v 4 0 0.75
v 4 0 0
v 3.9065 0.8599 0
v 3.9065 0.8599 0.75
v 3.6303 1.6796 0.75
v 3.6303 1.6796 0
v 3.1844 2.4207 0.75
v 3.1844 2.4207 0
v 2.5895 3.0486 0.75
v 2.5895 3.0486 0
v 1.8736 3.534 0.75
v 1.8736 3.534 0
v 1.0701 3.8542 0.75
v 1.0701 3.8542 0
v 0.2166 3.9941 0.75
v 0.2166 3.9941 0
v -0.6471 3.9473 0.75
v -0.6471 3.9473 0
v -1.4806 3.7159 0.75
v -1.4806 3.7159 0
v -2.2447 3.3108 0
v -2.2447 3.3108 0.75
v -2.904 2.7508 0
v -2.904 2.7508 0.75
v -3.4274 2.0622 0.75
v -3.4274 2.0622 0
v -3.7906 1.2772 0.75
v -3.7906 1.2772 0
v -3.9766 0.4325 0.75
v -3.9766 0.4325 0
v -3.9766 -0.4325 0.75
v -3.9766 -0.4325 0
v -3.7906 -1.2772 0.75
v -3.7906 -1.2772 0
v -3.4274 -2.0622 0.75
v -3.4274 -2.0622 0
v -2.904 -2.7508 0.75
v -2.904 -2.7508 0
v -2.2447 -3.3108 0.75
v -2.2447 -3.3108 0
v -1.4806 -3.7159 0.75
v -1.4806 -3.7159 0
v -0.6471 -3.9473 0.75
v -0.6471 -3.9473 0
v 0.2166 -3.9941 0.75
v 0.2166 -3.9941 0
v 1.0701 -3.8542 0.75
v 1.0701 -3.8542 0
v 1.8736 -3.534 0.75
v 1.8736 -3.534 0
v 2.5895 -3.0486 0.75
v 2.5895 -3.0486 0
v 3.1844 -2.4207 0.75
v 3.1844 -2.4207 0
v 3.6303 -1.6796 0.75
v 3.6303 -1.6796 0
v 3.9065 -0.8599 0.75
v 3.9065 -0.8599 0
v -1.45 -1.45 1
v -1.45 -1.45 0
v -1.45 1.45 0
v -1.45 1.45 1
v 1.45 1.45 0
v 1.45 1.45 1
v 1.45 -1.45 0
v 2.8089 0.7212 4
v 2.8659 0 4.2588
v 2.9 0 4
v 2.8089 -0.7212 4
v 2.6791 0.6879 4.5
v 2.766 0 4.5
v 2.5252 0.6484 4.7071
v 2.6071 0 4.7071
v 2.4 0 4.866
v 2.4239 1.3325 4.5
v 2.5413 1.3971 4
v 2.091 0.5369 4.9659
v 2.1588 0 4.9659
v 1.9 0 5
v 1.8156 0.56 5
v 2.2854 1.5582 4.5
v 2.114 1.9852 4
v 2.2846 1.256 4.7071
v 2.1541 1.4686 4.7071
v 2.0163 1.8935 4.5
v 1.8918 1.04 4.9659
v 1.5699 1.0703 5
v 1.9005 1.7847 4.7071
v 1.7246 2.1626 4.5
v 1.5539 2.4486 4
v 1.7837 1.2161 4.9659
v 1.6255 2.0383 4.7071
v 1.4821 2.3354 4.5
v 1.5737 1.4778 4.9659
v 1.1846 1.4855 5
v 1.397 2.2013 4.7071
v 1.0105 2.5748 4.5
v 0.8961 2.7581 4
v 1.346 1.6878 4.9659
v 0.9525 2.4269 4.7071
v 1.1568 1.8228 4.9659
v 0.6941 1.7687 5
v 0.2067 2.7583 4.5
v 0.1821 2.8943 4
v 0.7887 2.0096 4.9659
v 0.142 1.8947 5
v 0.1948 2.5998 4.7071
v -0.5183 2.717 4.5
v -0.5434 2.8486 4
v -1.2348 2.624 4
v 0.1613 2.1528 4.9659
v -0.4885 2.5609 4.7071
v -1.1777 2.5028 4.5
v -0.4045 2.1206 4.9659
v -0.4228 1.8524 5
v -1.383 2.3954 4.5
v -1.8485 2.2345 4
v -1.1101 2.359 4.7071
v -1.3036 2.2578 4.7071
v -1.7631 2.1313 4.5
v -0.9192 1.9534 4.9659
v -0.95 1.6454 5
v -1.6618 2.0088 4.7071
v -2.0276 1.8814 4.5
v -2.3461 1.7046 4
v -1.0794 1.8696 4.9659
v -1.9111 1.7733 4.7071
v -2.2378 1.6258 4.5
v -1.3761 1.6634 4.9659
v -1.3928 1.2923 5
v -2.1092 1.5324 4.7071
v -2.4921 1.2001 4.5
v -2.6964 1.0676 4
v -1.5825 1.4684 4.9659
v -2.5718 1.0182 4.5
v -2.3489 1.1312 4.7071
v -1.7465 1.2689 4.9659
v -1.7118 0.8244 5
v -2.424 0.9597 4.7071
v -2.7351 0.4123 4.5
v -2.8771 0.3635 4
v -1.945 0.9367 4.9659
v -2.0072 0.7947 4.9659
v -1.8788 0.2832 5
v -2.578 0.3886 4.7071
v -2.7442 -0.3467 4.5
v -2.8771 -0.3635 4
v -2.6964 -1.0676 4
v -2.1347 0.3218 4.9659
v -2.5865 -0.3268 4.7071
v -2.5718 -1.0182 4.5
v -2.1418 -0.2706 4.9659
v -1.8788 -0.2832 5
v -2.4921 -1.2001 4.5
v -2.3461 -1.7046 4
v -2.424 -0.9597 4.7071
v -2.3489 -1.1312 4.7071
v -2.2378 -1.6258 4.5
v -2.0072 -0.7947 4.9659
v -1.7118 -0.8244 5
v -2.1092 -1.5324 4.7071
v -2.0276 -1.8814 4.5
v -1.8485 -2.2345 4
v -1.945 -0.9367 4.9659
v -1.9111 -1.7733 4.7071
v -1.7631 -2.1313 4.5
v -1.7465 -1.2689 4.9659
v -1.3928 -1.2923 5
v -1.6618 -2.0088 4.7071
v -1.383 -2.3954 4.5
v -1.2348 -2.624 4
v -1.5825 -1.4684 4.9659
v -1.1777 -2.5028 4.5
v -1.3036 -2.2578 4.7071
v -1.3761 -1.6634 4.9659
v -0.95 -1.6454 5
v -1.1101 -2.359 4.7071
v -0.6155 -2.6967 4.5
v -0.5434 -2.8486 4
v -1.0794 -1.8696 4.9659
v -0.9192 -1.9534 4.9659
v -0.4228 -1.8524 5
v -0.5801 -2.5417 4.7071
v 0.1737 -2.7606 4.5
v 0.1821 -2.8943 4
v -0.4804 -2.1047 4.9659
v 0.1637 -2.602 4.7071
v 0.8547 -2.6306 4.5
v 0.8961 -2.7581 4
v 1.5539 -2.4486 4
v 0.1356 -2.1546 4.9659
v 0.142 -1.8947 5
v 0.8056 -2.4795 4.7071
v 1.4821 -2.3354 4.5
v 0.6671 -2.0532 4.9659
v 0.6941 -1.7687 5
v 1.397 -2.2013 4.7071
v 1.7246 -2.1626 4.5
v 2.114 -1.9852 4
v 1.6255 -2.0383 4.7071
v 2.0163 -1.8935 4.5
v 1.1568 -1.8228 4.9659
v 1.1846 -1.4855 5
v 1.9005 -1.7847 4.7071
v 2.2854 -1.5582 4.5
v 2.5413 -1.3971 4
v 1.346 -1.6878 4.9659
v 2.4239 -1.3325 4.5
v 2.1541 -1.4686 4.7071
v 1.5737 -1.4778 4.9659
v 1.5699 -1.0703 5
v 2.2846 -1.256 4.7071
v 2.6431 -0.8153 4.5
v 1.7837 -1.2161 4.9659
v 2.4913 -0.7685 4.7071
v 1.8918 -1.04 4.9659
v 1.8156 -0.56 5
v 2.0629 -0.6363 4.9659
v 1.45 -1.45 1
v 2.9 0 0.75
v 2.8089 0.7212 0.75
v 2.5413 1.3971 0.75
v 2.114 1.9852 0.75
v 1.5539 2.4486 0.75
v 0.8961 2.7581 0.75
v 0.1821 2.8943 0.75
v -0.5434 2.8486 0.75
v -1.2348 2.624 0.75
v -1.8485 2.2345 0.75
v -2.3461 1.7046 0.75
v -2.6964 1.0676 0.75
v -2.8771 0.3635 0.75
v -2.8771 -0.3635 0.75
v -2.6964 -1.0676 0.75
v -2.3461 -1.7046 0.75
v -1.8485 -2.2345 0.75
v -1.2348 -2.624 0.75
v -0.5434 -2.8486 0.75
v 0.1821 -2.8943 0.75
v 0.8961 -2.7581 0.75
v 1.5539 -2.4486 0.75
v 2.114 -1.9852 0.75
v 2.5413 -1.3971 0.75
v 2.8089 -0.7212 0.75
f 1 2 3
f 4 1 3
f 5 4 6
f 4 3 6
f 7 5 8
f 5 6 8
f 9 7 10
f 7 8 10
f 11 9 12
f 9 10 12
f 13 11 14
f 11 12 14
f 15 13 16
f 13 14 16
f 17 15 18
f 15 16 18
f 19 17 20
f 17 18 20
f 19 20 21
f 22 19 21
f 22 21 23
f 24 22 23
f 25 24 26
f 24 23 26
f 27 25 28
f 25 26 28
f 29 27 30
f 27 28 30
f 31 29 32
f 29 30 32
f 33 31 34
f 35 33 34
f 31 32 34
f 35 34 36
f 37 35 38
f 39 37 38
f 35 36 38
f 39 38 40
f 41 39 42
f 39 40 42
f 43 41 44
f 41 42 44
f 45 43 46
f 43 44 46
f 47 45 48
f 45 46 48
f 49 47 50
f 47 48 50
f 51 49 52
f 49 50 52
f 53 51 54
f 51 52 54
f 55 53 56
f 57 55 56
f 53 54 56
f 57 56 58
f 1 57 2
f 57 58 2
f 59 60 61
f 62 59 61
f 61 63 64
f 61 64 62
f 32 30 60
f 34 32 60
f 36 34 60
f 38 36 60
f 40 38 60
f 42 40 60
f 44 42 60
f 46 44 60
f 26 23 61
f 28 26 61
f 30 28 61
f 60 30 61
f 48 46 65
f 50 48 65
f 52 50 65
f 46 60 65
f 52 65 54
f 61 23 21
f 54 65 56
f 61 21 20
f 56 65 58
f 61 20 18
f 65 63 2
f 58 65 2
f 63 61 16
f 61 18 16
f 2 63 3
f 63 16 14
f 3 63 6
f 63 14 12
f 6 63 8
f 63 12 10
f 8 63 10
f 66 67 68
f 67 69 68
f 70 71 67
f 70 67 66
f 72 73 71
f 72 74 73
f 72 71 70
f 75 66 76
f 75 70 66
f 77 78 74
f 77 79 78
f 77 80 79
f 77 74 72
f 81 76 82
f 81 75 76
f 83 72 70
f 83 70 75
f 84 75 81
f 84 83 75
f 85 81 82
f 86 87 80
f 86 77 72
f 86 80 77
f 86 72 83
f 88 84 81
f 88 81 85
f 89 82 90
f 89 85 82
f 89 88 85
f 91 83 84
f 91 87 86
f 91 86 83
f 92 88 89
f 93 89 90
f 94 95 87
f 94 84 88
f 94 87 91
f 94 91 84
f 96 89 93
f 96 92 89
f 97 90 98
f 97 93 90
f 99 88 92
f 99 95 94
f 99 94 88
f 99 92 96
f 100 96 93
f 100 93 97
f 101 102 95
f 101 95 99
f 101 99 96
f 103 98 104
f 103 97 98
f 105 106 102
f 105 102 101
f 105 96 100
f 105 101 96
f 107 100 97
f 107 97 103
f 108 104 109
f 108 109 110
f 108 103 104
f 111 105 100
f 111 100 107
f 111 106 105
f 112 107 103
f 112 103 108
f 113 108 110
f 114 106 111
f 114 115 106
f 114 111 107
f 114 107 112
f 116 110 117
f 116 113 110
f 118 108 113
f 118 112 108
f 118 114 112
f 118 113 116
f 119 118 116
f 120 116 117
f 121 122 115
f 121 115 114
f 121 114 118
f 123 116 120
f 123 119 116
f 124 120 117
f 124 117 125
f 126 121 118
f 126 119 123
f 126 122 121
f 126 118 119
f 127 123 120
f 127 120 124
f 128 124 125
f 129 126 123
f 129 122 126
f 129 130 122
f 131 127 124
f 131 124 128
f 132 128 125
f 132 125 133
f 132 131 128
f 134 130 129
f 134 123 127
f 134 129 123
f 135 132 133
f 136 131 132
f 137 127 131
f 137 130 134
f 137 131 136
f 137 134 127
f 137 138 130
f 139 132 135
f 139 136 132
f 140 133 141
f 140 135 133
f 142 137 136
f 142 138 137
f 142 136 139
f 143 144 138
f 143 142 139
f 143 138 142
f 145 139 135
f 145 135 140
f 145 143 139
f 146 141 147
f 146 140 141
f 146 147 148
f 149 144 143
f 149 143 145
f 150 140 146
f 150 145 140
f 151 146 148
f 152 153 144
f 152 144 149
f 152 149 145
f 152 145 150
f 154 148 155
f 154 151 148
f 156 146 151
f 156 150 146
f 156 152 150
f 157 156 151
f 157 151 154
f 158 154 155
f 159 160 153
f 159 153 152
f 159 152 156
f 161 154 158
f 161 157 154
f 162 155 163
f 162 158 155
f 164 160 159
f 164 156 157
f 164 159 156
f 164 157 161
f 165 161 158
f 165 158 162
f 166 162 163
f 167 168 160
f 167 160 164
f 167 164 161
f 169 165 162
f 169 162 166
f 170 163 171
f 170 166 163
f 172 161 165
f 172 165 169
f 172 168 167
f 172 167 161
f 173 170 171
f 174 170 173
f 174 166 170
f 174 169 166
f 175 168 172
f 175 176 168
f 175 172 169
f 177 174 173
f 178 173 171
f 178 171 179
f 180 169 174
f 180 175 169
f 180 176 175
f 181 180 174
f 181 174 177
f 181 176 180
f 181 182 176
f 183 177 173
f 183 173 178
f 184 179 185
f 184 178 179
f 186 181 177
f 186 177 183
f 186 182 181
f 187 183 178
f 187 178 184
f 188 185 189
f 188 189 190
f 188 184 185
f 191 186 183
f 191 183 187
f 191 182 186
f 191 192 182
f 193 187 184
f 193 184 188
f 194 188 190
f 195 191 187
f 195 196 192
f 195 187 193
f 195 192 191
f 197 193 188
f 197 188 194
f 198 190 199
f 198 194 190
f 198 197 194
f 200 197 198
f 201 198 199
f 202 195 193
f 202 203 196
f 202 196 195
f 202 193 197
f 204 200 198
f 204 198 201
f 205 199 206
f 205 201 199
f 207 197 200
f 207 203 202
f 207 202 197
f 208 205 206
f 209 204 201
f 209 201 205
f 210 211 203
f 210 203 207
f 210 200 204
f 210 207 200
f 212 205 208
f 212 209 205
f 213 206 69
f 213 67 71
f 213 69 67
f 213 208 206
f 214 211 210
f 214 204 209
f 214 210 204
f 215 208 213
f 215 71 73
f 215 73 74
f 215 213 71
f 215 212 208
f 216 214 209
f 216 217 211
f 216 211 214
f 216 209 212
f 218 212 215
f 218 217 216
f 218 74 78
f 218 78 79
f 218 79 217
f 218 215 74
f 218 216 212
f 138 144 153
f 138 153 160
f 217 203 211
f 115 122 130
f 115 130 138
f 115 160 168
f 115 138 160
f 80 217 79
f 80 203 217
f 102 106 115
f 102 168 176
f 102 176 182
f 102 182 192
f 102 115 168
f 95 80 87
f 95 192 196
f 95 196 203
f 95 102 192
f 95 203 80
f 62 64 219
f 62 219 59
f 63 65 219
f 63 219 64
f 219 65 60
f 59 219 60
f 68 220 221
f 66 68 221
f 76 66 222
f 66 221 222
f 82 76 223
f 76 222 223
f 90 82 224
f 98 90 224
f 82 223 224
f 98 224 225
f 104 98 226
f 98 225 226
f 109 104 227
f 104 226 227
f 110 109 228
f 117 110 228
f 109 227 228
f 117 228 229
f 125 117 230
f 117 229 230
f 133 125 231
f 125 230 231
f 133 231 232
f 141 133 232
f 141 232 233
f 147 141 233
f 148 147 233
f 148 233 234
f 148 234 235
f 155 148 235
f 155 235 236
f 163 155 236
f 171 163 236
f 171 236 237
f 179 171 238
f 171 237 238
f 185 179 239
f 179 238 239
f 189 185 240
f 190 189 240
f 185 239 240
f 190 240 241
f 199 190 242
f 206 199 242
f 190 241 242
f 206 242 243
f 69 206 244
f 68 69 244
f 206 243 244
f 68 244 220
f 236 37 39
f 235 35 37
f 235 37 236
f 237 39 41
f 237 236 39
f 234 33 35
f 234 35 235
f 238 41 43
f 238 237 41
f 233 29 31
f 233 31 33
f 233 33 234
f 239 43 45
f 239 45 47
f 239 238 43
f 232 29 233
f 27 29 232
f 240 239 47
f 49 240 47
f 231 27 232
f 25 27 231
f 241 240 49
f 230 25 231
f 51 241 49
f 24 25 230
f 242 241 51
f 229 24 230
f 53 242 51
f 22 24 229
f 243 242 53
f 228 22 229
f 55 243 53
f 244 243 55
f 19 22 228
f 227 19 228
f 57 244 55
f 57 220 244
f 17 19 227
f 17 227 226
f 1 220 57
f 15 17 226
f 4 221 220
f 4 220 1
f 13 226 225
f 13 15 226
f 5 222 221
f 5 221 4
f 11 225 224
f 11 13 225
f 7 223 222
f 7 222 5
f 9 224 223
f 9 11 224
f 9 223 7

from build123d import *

# Parameters (mm, degrees)
SZKIC1_R                    = 4
DODANIE_WYCI_GNI_CIE1_DEPTH = 0.75
SZKIC2_R                    = 2.9
DODANIE_WYCI_GNI_CIE2_DEPTH = 4.25
SZKIC3_W                    = 2.5
SZKIC3_H                    = 2.5
WYTNIJ_WYCI_GNI_CIE1_DEPTH  = 1
ZAOKR_GLENIE2_R             = 1
SZKIC4_W                    = 2.9
SZKIC4_H                    = 2.9
WYTNIJ_WYCI_GNI_CIE2_DEPTH  = 1


with BuildPart() as part:
    # Szkic1 → Dodanie-wyciągnięcie1 (new body)
    with BuildSketch(Plane.XY):
        Circle(SZKIC1_R)
    extrude(amount=DODANIE_WYCI_GNI_CIE1_DEPTH)

    # Szkic2 → Dodanie-wyciągnięcie2 (add)
    with BuildSketch(Plane.XY.offset(0.75)):
        Circle(SZKIC2_R)
    extrude(amount=DODANIE_WYCI_GNI_CIE2_DEPTH)

    # Szkic3 → Wytnij-wyciągnięcie1 (cut)
    with BuildSketch(Plane(origin=(0, 0, 0), x_dir=(-1, 0, 0), z_dir=(0, 0, -1))):
        Rectangle(SZKIC3_W, SZKIC3_H)
    extrude(amount=-WYTNIJ_WYCI_GNI_CIE1_DEPTH, mode=Mode.SUBTRACT)

    # Zaokrąglenie2
    zaokr_glenie2_edges = [part.edges().sort_by_distance(p)[0] for p in [
        (-2.9, 0, 5),
    ]]
    fillet(zaokr_glenie2_edges, radius=ZAOKR_GLENIE2_R)

    # Szkic4 → Wytnij-wyciągnięcie2 (cut)
    with BuildSketch(Plane(origin=(0, 0, 0), x_dir=(-1, 0, 0), z_dir=(0, 0, -1))):
        Rectangle(SZKIC4_W, SZKIC4_H)
    extrude(amount=-WYTNIJ_WYCI_GNI_CIE2_DEPTH, mode=Mode.SUBTRACT)


solid = part.part
